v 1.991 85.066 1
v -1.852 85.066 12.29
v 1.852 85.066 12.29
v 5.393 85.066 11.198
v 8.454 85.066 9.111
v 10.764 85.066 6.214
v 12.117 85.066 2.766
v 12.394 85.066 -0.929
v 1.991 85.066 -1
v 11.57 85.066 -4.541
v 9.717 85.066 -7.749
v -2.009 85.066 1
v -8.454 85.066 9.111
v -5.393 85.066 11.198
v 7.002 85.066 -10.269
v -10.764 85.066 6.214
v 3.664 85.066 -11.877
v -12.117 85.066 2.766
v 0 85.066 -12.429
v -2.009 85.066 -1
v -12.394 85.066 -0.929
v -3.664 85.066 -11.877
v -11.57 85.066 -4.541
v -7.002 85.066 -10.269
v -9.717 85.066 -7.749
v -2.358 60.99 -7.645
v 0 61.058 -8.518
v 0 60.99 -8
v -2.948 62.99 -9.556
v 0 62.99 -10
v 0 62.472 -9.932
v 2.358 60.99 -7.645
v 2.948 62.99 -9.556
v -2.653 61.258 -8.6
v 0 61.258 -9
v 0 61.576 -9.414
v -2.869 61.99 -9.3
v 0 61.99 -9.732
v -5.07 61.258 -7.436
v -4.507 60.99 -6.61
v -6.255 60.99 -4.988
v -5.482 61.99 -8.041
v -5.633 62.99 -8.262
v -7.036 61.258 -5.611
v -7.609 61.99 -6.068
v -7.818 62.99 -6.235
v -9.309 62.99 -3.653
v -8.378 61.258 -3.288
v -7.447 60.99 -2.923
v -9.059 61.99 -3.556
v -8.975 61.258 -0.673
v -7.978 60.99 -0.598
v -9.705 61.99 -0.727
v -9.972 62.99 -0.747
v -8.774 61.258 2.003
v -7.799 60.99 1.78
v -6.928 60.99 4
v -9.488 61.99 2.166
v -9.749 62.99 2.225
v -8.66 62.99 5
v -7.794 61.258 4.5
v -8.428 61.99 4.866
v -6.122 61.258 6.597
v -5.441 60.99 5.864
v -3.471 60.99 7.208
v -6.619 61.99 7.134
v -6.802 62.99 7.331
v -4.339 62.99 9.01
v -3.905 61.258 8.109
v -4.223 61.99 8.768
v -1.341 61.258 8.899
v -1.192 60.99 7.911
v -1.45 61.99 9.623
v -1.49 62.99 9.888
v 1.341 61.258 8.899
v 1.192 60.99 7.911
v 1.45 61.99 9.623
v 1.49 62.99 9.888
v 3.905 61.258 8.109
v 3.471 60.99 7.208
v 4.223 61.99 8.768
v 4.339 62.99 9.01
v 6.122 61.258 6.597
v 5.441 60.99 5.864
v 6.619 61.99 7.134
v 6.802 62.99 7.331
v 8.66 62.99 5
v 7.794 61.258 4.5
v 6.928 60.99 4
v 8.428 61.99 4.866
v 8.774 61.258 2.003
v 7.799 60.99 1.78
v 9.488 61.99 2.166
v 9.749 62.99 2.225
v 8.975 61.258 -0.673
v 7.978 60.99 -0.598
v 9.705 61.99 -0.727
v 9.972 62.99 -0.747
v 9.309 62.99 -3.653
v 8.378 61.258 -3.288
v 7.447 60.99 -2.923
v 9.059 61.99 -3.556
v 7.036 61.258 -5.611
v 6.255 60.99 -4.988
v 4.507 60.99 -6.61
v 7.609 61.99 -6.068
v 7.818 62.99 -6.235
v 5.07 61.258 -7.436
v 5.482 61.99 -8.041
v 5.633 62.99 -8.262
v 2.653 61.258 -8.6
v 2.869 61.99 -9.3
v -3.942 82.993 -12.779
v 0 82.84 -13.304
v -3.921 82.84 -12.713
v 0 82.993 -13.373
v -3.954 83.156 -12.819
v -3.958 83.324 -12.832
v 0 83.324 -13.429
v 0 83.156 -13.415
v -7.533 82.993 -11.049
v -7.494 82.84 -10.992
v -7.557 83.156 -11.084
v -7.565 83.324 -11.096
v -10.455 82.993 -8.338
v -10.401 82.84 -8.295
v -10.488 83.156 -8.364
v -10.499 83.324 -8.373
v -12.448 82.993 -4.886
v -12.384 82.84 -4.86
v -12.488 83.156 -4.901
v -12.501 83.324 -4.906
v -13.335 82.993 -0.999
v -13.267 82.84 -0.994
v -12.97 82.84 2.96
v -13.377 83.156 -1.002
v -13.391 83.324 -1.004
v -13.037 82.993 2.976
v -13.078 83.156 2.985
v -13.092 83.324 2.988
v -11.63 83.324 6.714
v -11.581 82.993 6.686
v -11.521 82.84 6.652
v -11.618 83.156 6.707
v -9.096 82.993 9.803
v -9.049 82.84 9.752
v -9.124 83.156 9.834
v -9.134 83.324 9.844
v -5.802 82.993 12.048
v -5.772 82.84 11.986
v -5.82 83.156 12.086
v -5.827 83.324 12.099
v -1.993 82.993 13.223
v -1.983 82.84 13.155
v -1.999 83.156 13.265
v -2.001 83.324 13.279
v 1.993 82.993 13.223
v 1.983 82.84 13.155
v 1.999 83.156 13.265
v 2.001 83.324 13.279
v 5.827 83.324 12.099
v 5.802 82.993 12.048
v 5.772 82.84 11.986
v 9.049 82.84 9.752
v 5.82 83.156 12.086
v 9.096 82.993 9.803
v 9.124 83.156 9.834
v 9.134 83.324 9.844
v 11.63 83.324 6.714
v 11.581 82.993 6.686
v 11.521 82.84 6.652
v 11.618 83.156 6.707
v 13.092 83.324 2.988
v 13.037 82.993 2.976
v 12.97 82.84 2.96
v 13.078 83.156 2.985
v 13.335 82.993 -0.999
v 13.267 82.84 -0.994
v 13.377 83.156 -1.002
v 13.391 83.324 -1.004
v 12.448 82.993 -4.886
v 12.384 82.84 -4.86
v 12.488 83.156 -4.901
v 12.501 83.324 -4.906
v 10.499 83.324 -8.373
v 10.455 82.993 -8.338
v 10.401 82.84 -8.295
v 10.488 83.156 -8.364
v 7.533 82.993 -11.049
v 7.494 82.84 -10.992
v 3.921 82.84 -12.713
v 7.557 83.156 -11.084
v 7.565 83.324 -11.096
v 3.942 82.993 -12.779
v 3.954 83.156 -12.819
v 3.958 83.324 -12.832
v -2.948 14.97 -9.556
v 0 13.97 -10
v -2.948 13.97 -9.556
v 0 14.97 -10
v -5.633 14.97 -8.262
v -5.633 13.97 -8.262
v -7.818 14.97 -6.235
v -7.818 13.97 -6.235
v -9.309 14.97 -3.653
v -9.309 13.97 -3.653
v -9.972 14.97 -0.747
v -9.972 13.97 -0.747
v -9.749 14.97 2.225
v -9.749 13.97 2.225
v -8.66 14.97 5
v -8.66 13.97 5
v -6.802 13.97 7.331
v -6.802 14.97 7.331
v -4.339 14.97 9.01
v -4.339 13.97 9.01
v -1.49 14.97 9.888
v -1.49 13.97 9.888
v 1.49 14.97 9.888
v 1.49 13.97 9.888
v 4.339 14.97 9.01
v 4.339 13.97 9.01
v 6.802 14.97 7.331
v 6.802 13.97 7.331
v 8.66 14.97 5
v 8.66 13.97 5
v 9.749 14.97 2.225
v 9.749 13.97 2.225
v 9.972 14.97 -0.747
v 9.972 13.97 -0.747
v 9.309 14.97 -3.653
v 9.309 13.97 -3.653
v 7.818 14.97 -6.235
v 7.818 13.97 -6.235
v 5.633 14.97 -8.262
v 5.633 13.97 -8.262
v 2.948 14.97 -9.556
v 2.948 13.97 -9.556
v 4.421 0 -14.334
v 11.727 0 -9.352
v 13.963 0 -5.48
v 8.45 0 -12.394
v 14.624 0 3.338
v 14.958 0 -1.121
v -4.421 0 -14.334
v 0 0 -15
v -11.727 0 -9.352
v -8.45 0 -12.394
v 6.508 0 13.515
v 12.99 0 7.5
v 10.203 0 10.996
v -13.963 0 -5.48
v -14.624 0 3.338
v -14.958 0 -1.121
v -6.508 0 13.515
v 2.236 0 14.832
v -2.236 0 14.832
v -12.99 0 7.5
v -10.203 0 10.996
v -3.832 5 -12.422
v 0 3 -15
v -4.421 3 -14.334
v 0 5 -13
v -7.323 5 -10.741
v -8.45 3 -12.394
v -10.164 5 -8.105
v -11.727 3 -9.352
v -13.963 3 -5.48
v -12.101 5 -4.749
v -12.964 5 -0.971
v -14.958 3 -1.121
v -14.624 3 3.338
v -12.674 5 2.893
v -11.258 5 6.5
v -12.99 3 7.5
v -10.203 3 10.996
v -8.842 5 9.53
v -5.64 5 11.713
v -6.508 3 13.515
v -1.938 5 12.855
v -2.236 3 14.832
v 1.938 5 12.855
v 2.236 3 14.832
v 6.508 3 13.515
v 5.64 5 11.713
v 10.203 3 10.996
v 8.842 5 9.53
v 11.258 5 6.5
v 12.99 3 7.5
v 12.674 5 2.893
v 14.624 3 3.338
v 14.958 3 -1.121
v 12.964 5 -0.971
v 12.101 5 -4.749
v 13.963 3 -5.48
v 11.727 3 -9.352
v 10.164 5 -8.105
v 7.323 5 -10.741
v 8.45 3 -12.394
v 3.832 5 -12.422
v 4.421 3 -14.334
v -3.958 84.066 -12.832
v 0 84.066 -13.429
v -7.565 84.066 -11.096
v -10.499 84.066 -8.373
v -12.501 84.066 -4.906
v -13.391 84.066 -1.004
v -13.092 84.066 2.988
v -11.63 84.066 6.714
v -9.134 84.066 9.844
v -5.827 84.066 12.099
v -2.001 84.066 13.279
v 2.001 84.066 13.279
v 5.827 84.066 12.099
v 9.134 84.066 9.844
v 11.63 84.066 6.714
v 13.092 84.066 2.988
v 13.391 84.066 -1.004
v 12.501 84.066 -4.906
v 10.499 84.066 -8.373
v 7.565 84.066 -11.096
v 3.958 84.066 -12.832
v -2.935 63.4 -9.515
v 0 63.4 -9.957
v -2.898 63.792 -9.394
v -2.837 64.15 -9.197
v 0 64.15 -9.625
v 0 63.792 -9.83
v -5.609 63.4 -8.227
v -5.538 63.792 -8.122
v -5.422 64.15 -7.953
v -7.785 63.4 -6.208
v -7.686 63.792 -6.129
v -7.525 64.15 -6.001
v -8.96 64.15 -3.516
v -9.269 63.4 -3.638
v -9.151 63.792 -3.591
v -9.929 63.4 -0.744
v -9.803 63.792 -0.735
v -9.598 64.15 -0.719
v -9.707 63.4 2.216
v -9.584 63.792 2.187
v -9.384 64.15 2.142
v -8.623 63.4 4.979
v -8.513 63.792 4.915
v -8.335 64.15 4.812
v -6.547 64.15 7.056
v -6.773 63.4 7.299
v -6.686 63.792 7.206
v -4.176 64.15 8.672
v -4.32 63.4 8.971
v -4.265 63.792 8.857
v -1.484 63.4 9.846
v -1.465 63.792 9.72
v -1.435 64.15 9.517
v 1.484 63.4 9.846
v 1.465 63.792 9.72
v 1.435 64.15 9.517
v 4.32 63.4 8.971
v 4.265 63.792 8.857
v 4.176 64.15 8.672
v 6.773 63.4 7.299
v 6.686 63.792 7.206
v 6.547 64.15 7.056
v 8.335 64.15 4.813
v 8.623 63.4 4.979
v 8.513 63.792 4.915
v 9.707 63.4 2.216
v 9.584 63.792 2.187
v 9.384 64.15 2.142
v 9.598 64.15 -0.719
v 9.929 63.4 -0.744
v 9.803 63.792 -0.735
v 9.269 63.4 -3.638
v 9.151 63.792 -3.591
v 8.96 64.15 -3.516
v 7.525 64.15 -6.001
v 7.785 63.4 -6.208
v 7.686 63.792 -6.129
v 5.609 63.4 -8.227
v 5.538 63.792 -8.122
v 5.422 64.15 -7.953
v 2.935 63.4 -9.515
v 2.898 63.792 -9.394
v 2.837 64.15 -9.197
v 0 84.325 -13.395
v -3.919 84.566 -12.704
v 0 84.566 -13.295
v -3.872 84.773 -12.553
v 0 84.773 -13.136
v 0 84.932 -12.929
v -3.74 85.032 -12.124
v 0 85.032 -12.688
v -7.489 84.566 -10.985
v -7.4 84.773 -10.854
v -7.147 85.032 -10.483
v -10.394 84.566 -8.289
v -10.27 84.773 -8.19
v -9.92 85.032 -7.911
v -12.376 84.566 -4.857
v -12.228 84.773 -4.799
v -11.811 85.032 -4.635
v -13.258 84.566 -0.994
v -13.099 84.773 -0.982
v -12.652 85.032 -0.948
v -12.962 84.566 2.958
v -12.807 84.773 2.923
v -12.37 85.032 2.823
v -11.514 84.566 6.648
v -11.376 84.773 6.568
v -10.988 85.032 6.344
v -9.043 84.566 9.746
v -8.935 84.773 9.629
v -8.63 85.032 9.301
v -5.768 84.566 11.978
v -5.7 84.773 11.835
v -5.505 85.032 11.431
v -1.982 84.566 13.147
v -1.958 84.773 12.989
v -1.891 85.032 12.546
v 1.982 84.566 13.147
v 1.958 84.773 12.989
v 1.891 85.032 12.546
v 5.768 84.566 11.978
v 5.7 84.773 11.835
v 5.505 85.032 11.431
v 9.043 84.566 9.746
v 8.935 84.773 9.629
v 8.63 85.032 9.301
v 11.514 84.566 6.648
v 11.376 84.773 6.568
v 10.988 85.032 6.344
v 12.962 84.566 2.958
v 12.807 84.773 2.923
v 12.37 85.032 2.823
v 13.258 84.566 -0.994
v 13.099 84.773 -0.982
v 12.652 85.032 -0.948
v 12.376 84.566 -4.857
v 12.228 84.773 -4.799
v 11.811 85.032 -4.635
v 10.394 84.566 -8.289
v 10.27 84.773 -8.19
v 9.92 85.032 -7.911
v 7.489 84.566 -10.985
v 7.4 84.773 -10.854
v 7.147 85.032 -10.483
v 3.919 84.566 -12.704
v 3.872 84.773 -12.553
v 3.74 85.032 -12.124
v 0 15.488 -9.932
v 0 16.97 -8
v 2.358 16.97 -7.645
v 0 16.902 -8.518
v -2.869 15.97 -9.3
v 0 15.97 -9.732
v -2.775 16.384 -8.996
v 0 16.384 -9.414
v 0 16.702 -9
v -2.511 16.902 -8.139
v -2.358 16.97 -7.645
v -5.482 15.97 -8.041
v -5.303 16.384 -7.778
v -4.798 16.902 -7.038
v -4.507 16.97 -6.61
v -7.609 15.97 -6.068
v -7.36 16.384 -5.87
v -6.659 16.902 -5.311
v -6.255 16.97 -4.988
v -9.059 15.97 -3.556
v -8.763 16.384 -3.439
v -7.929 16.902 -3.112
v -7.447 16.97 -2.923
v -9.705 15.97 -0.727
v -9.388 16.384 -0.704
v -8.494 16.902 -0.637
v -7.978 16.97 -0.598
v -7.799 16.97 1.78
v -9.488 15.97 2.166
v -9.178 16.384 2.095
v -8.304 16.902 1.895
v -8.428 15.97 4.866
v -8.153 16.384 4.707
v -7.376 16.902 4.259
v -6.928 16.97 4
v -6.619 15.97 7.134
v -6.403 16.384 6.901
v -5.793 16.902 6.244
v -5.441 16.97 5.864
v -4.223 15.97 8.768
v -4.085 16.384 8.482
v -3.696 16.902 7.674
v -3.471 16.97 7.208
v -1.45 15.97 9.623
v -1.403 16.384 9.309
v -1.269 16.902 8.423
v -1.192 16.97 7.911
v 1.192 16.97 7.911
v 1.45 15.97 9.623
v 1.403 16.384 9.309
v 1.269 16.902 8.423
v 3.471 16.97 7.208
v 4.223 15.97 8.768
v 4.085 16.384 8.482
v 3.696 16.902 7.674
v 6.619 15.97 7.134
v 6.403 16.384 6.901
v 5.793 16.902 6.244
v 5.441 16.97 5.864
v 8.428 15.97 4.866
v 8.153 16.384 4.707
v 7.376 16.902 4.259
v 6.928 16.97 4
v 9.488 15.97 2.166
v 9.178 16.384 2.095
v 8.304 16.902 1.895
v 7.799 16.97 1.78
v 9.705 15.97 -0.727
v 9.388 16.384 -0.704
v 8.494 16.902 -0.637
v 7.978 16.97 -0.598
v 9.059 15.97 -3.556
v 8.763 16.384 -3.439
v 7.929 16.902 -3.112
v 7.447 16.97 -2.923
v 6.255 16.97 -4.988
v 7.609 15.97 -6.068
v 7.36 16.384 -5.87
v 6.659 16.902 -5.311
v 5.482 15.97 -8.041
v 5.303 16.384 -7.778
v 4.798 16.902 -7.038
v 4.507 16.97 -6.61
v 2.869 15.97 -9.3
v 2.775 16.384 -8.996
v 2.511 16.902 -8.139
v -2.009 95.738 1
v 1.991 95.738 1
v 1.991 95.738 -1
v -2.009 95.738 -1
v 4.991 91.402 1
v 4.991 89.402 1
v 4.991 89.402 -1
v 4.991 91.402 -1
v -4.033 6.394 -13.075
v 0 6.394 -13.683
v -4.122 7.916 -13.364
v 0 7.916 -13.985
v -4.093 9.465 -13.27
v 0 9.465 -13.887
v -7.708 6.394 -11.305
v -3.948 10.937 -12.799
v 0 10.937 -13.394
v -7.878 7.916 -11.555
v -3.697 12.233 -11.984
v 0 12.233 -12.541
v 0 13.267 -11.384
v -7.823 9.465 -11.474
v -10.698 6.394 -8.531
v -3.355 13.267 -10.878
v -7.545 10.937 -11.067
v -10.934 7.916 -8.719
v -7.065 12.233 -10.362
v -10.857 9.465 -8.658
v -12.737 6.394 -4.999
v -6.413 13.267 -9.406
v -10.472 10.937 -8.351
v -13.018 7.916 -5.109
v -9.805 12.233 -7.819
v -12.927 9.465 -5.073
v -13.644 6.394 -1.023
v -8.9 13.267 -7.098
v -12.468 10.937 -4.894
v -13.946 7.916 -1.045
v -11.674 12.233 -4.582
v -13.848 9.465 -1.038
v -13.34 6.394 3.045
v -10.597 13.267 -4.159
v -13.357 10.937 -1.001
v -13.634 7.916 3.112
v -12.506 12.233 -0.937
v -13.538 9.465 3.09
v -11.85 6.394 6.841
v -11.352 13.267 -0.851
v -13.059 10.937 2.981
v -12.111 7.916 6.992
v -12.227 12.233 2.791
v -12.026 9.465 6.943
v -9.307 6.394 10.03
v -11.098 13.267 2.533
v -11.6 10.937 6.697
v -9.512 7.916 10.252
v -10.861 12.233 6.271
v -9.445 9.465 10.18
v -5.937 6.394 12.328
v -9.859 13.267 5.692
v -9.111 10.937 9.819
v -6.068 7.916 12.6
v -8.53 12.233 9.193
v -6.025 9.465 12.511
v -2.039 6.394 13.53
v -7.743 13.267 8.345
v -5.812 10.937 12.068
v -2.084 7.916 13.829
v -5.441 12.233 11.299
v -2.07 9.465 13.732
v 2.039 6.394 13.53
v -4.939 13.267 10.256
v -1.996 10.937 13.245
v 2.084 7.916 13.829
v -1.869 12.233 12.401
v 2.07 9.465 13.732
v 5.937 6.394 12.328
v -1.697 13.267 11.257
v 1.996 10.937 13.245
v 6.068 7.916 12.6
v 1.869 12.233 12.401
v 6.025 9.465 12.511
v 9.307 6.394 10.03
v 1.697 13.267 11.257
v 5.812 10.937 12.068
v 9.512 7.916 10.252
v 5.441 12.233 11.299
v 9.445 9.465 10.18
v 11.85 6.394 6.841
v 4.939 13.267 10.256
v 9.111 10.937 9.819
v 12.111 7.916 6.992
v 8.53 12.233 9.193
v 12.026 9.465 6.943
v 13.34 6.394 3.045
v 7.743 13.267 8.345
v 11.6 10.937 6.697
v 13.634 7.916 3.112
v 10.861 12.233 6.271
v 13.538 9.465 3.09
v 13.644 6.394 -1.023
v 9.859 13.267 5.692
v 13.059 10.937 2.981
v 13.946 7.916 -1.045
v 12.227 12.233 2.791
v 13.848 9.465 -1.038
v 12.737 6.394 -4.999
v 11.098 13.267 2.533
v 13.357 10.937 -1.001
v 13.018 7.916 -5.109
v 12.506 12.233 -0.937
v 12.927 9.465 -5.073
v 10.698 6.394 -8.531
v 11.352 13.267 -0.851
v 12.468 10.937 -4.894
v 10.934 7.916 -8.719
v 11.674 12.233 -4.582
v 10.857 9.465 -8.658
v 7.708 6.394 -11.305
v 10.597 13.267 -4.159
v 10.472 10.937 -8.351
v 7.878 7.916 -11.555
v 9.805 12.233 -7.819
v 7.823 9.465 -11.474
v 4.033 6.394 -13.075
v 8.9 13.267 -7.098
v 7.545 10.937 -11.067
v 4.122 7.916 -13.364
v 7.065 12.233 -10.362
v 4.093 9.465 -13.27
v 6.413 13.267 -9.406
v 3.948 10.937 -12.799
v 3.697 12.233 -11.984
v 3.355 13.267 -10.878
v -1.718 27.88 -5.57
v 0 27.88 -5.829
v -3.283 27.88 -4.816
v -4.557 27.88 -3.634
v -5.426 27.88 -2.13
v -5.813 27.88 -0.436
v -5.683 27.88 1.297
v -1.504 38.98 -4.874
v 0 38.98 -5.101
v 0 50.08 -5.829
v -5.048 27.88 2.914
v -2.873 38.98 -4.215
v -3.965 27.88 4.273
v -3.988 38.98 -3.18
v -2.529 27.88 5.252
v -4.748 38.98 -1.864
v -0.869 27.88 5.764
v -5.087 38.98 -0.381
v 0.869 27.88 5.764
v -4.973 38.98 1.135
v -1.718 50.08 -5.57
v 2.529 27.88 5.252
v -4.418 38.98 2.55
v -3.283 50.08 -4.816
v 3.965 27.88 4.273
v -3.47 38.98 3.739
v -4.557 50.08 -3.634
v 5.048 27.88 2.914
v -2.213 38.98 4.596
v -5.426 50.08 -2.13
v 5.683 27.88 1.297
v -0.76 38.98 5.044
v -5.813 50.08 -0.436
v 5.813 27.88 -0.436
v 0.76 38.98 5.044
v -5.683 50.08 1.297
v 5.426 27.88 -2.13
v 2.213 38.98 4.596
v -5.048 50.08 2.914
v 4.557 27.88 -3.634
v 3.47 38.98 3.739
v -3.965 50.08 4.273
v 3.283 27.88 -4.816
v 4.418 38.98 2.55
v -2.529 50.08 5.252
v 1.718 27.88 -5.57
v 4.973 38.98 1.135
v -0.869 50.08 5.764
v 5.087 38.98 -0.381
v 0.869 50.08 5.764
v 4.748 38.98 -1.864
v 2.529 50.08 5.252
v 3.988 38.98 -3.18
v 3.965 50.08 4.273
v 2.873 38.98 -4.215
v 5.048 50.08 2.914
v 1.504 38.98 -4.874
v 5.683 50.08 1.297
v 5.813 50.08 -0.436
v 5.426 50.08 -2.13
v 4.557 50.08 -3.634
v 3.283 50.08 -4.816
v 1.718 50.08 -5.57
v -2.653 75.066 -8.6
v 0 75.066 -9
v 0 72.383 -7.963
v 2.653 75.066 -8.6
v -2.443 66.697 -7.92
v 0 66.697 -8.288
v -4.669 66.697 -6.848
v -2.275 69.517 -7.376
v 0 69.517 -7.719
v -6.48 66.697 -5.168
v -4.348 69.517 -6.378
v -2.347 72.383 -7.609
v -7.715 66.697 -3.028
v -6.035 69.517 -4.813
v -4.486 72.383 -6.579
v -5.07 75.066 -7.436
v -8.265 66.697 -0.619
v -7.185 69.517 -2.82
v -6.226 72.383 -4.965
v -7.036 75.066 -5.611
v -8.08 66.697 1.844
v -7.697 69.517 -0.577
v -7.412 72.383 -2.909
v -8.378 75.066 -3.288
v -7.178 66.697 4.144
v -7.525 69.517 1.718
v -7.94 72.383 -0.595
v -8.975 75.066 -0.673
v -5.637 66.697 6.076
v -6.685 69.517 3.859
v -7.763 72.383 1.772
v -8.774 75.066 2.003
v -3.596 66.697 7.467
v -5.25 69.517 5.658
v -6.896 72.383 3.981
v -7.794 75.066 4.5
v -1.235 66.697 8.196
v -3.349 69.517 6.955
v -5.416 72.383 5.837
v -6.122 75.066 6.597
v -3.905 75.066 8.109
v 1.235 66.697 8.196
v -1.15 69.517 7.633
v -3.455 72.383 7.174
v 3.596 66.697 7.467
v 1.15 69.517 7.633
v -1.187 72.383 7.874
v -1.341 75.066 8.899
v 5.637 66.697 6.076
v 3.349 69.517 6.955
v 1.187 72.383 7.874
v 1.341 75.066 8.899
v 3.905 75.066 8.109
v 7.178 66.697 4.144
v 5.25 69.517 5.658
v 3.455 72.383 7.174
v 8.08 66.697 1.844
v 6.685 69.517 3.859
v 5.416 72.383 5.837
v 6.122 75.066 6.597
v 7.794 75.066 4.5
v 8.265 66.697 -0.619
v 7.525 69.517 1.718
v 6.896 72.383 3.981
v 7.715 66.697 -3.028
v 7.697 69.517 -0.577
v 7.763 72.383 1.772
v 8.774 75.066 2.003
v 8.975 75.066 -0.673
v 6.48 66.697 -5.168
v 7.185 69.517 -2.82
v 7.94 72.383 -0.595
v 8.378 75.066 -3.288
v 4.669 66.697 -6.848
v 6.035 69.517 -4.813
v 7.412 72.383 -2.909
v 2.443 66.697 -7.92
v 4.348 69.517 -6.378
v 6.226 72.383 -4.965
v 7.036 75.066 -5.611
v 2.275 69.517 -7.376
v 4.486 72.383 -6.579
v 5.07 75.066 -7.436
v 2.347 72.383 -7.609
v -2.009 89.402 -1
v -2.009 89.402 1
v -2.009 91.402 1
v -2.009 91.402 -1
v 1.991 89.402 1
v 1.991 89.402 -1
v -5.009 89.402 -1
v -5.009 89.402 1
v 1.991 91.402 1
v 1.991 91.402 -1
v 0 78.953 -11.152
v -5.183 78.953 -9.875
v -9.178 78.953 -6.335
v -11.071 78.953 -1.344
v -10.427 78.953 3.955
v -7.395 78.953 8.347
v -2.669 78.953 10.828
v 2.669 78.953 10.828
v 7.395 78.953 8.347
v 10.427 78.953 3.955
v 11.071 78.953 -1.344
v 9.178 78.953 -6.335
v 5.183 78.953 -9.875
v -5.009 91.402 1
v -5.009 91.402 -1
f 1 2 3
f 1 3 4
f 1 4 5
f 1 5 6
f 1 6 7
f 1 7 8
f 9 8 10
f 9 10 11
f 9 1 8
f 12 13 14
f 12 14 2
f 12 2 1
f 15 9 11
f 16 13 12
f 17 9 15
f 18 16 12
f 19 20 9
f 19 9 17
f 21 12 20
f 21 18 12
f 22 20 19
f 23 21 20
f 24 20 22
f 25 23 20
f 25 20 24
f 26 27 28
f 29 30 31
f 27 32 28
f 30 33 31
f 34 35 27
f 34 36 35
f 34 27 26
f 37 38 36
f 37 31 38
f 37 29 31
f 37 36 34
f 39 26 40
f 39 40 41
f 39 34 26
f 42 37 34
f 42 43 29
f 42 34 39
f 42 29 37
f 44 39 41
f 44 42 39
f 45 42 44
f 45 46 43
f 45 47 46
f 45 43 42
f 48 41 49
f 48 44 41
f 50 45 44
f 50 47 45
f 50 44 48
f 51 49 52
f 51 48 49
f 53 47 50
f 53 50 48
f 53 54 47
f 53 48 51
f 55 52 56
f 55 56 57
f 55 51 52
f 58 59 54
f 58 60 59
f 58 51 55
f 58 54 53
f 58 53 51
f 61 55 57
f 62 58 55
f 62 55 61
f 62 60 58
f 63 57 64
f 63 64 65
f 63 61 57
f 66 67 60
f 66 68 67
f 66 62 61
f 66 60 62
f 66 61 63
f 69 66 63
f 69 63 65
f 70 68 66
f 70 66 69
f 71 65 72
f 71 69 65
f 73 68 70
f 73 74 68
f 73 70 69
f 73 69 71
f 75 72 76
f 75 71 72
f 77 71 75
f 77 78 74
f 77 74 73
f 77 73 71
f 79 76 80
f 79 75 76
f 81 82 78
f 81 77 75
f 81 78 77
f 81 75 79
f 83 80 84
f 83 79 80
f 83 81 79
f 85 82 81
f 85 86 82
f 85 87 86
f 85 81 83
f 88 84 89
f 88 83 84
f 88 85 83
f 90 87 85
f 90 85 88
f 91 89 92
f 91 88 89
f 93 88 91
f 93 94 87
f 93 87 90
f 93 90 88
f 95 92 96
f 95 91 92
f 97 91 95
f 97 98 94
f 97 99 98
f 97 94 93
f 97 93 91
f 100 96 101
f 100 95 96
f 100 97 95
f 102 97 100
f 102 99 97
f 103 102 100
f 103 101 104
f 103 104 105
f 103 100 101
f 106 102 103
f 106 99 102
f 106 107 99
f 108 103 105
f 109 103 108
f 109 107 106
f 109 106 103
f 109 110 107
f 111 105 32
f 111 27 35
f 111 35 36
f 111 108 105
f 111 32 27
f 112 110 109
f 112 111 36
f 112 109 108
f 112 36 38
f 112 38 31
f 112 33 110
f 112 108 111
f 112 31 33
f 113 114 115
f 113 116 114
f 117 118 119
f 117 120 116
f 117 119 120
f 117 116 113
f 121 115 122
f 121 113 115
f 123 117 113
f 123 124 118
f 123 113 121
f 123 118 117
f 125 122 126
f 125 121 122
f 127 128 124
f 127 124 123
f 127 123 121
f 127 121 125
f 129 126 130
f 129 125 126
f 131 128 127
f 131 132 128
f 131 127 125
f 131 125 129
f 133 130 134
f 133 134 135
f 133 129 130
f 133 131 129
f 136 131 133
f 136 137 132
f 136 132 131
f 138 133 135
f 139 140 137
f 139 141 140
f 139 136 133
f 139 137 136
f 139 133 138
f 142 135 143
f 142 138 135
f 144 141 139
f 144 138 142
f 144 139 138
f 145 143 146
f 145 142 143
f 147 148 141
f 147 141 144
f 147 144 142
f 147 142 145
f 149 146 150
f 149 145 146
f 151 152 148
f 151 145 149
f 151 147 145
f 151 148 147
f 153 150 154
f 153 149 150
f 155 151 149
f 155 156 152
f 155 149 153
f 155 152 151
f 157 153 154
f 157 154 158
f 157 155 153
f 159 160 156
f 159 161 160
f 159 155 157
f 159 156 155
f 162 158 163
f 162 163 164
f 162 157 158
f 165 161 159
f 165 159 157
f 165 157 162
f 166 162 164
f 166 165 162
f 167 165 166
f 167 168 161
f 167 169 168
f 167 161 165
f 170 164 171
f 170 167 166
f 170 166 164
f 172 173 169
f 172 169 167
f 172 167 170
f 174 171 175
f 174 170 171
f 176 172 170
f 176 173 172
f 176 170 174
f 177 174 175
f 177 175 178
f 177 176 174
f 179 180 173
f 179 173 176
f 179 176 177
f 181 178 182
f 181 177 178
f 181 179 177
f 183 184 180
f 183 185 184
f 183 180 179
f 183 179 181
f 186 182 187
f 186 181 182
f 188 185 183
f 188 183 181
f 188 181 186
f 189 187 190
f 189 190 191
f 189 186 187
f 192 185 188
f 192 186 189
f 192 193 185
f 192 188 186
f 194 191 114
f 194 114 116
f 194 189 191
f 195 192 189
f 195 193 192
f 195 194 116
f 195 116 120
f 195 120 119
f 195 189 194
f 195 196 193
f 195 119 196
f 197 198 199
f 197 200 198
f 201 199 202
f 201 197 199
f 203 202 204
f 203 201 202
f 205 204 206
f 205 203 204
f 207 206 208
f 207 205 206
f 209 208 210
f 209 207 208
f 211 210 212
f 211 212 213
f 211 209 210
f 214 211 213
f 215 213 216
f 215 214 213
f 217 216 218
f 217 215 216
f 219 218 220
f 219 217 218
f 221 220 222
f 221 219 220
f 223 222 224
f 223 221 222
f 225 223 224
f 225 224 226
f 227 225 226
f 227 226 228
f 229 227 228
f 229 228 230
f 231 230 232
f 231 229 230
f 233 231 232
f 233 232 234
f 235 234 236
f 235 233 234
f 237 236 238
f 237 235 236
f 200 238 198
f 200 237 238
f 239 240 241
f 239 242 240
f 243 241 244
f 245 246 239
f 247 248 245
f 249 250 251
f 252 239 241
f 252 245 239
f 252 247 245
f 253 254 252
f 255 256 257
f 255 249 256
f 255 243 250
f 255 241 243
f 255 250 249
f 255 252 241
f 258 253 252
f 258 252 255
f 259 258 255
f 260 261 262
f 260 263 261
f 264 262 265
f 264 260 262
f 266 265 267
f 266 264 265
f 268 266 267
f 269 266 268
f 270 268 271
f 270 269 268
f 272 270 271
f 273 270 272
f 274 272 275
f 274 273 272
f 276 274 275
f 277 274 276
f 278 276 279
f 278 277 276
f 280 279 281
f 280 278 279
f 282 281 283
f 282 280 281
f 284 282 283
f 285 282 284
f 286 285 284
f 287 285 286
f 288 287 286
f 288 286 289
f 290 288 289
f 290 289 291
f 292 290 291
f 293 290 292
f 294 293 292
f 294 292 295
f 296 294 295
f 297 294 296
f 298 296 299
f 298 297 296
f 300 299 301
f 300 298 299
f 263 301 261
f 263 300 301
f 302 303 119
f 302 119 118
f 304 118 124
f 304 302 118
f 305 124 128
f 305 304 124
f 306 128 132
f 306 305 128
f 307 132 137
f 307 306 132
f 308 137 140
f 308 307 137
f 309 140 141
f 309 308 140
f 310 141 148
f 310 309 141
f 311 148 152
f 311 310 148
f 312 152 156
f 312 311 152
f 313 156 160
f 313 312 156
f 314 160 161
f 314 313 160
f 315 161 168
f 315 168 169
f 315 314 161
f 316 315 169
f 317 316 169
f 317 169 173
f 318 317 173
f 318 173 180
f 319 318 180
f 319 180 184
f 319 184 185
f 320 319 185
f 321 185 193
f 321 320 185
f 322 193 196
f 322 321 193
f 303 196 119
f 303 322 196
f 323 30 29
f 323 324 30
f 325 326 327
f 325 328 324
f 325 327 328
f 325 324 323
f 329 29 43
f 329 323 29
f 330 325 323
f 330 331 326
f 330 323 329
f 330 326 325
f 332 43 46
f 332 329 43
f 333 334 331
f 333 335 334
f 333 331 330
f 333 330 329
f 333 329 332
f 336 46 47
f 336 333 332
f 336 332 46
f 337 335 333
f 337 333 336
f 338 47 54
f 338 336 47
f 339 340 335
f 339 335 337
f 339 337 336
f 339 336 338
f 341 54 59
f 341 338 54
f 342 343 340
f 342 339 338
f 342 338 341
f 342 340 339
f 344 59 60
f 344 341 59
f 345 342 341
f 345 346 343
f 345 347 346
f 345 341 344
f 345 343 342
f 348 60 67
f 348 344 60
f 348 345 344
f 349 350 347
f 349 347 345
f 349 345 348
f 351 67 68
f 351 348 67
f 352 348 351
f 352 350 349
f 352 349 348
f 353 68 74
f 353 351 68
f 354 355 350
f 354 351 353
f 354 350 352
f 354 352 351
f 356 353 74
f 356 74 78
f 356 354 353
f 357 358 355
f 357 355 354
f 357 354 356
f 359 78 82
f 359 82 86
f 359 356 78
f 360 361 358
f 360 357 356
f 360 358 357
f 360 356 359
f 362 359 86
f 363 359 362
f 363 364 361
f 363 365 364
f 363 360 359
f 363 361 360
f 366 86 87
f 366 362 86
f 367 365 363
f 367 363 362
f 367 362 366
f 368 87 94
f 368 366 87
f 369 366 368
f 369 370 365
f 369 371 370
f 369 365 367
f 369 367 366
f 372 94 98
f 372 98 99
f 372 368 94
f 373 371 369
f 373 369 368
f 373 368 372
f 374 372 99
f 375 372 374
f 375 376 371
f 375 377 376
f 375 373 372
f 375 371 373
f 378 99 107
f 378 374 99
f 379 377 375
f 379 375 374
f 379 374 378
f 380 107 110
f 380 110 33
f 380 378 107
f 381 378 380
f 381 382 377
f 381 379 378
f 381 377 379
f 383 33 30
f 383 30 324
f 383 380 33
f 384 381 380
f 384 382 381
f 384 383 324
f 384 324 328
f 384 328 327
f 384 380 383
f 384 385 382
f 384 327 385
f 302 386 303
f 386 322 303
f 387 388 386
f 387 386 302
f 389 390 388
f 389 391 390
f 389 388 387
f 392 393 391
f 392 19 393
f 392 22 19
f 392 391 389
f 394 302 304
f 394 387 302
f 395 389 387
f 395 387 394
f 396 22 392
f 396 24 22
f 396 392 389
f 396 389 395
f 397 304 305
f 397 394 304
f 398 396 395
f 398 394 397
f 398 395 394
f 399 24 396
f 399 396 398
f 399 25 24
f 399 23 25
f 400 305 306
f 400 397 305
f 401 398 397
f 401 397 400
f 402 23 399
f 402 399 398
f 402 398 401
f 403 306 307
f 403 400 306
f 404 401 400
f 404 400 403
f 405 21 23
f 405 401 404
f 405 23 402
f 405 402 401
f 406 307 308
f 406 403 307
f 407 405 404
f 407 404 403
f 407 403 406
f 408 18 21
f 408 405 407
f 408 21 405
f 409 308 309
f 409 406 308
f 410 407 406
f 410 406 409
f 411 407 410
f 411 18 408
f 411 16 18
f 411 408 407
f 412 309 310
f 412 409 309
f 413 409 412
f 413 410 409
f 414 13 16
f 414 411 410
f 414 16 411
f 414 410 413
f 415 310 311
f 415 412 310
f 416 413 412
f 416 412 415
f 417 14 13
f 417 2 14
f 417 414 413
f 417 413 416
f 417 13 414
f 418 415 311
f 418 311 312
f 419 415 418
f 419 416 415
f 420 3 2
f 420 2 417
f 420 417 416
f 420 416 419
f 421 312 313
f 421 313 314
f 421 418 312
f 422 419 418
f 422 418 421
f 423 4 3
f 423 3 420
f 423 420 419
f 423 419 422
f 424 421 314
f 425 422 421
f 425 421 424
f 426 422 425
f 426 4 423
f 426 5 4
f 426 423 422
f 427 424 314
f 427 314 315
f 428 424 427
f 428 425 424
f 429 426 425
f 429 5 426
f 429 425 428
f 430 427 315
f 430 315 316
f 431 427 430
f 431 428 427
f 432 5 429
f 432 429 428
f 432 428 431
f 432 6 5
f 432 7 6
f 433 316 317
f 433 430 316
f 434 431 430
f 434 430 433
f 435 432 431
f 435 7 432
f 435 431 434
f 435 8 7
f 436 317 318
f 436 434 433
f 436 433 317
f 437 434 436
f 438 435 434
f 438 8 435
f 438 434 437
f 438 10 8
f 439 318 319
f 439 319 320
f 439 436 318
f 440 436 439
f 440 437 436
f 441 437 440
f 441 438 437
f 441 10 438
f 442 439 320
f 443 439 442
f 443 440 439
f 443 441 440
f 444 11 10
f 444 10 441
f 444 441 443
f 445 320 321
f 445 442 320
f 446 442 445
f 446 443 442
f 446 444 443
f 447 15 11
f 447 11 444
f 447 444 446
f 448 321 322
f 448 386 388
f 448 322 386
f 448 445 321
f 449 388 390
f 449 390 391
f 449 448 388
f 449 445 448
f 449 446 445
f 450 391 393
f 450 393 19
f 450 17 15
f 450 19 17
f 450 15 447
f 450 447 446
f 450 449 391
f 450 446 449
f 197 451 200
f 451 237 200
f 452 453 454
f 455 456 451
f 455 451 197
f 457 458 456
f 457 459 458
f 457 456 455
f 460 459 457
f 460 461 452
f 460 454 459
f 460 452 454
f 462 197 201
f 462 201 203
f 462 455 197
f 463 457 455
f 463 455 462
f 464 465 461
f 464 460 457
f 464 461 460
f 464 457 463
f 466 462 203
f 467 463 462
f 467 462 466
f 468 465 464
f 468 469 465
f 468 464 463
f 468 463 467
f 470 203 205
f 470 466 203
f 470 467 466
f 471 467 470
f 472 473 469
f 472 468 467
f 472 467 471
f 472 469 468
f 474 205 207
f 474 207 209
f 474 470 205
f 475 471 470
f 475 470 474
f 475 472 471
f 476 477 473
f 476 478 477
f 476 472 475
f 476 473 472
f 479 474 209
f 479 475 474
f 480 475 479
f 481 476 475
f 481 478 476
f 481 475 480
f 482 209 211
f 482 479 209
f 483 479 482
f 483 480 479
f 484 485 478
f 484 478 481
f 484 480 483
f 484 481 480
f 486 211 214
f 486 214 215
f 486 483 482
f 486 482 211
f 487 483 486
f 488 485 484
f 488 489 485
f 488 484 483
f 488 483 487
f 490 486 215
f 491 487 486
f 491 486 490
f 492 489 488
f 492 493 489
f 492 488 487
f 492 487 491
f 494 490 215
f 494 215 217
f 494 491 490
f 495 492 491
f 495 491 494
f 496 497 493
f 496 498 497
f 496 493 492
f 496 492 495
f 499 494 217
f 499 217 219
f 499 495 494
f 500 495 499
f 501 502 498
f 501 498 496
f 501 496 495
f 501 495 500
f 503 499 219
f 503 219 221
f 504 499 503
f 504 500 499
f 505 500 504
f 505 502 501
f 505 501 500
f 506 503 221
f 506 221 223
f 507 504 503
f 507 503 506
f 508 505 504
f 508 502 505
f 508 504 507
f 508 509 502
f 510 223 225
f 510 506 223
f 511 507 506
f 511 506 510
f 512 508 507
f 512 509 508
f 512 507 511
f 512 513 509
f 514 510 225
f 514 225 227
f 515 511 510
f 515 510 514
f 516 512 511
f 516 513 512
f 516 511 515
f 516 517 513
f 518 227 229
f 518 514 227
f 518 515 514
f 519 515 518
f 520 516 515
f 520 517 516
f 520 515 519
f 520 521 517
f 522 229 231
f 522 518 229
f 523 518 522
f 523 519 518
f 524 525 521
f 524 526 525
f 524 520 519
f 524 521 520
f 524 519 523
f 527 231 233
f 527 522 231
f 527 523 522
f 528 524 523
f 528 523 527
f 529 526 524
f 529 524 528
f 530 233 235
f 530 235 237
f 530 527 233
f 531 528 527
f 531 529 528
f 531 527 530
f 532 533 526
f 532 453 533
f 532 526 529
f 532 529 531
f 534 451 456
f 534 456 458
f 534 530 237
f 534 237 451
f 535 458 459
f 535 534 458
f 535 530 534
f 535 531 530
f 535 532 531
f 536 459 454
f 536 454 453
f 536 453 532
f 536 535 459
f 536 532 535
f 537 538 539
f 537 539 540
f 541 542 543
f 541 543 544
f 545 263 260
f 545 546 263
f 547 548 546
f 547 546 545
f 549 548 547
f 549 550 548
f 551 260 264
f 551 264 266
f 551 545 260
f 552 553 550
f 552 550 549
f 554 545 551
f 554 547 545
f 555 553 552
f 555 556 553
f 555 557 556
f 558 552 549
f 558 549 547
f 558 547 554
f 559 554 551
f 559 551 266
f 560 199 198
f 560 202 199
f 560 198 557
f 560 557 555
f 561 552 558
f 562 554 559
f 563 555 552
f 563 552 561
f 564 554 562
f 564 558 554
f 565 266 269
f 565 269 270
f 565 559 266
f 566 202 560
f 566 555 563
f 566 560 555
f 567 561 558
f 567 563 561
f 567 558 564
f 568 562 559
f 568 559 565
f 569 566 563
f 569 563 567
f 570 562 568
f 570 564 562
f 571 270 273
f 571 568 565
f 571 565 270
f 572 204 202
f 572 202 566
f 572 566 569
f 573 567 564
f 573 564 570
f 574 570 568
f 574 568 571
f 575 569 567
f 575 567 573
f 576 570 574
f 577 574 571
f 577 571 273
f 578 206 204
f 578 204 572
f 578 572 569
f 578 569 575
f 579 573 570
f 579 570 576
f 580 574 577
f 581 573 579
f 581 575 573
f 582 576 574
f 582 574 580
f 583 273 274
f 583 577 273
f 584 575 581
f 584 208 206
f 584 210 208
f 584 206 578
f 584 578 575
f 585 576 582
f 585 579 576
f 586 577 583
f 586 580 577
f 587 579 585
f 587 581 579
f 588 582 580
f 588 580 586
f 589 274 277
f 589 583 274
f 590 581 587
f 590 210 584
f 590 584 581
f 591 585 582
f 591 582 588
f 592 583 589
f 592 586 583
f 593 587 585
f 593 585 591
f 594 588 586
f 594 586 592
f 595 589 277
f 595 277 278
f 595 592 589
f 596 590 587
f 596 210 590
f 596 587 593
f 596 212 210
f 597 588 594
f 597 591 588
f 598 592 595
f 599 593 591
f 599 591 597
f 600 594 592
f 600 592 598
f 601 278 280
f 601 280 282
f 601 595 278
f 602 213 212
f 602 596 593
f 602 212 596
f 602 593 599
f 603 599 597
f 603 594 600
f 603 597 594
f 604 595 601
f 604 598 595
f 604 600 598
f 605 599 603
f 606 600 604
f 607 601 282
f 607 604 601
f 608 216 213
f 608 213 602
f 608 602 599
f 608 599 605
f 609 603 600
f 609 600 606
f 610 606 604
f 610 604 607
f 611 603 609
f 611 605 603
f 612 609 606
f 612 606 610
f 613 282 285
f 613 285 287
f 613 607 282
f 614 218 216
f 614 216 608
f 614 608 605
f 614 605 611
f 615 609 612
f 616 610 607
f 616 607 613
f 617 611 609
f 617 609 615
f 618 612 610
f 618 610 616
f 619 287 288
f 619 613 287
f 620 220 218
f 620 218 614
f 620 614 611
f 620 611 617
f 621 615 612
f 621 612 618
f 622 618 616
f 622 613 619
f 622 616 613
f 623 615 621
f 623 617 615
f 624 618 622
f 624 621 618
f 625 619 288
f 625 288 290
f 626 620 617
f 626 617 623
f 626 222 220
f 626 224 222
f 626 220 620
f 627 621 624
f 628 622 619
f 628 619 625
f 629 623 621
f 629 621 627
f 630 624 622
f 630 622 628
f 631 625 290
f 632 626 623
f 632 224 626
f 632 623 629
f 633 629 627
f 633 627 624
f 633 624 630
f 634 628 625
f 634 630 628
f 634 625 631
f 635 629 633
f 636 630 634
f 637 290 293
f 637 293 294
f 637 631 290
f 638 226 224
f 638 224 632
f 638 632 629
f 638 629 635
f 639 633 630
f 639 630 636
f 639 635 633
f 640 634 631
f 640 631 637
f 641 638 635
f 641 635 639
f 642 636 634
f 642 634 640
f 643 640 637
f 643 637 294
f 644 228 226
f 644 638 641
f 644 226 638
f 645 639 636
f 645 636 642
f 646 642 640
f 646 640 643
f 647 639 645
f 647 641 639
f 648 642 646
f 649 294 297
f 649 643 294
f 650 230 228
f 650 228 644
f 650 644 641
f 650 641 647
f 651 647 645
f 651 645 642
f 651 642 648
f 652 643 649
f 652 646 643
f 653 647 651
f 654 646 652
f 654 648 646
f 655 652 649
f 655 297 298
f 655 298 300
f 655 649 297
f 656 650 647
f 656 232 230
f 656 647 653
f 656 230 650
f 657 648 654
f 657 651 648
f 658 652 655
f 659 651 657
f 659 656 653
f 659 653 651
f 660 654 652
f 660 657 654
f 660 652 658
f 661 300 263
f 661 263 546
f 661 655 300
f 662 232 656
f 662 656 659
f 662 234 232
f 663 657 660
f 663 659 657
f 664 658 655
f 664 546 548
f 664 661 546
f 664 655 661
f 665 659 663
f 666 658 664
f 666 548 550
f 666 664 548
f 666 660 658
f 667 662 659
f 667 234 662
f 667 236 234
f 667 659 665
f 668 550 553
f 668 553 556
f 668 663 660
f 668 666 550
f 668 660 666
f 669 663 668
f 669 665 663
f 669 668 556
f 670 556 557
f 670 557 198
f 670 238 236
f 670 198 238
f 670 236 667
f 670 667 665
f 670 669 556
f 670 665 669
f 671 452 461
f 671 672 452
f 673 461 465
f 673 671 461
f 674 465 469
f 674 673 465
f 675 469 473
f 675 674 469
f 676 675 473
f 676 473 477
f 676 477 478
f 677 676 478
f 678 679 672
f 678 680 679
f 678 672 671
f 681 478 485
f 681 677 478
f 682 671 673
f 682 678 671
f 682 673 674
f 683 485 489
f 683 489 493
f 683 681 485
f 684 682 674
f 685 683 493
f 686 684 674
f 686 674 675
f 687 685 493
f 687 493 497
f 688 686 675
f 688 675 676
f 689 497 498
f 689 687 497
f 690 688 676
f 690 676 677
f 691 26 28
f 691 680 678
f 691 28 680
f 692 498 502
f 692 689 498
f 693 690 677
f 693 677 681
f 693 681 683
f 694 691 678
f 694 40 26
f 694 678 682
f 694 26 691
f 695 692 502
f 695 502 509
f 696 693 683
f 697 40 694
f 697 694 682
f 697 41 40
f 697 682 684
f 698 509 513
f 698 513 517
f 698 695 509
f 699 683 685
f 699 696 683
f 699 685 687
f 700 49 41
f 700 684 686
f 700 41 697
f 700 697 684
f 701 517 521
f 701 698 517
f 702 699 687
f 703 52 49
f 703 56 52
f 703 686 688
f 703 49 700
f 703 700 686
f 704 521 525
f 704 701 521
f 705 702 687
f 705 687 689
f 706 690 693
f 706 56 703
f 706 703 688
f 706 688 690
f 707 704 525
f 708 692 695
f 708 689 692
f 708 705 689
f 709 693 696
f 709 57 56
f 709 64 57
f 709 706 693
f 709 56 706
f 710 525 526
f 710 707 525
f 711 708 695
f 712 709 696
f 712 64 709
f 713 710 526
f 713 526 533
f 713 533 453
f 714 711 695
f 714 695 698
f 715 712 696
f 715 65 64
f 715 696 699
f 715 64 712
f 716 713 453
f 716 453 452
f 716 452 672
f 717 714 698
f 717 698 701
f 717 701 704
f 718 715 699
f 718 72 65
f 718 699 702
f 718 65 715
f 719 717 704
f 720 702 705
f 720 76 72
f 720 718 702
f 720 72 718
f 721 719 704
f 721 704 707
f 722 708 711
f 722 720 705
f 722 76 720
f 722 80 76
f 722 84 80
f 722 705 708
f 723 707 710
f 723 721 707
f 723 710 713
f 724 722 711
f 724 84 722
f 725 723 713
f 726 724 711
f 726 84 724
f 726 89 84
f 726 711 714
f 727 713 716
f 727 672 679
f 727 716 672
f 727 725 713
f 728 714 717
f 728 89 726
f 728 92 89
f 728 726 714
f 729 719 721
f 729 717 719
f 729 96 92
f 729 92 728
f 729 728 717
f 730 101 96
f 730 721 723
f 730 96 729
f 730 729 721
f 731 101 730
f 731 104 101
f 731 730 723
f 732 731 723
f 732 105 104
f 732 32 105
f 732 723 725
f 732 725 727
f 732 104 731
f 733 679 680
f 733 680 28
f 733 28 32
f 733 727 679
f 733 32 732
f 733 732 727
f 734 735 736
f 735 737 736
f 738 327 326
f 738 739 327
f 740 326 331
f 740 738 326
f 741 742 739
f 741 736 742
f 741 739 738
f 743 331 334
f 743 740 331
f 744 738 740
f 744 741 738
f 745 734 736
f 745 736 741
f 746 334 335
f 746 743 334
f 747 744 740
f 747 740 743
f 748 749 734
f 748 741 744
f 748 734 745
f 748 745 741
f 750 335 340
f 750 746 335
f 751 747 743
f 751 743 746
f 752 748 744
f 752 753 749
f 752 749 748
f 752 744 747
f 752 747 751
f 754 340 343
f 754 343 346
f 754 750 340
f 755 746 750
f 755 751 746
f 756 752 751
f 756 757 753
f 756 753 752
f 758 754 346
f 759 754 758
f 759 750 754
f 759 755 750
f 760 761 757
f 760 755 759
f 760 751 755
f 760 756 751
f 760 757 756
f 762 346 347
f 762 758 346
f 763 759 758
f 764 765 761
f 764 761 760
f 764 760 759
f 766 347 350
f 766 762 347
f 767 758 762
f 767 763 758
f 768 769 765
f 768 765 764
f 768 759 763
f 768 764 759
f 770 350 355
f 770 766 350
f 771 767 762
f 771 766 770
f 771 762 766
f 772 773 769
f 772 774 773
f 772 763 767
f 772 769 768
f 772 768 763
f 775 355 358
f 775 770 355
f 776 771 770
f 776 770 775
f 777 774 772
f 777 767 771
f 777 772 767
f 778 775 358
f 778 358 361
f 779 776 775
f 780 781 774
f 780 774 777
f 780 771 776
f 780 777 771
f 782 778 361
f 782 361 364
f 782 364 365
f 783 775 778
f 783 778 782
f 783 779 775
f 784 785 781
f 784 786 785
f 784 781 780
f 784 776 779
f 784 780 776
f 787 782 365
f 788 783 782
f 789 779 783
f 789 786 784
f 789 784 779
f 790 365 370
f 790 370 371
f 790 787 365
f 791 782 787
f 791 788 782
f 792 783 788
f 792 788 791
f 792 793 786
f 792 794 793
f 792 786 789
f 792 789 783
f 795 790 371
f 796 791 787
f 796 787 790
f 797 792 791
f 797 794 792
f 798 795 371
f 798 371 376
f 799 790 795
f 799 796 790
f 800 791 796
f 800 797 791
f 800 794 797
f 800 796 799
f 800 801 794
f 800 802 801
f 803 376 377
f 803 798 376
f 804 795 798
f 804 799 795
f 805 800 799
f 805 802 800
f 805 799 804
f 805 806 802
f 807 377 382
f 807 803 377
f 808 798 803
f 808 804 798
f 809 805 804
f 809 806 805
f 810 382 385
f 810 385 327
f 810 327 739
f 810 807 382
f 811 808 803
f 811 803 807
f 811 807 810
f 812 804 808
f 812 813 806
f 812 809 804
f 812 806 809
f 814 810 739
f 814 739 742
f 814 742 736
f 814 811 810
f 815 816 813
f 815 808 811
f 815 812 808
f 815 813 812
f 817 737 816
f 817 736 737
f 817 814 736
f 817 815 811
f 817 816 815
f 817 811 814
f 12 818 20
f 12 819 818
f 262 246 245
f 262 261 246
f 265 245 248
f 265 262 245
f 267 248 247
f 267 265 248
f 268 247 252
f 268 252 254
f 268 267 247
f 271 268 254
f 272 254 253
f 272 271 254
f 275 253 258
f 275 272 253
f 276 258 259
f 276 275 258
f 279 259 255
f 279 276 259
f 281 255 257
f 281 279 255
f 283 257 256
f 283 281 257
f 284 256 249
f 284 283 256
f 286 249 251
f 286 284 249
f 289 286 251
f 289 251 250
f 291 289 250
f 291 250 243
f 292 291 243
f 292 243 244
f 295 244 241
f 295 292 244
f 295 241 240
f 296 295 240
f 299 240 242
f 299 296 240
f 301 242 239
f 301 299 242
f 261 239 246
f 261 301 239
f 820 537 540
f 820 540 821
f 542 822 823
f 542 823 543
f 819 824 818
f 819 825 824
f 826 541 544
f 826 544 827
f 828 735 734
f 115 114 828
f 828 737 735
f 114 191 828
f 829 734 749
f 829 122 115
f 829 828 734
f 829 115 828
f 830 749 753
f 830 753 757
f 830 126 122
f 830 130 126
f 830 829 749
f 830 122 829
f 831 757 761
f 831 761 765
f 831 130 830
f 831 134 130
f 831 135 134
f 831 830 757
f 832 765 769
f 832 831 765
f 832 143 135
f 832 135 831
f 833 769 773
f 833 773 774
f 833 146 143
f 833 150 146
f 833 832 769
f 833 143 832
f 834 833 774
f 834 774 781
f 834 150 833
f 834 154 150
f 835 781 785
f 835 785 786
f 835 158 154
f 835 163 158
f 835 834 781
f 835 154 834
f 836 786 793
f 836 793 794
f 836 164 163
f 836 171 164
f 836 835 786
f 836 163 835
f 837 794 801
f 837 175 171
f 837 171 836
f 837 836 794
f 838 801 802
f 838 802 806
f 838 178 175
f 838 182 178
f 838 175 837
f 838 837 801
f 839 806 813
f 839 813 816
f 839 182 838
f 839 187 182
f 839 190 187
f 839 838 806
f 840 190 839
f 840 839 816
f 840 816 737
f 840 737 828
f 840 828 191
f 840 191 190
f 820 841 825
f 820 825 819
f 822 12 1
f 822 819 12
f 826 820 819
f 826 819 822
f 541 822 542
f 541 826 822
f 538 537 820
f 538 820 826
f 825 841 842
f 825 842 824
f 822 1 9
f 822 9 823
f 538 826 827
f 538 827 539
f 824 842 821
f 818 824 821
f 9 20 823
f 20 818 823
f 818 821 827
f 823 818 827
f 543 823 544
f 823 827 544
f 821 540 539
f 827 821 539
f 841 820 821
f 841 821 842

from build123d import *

# Parameters (mm, degrees)
FILLET1_R           = 1
BOSS_EXTRUDE1_DEPTH = 1


with BuildPart() as part:
    # Sketch1 → Revolve1 (revolve)
    with BuildSketch(Plane.XY, mode=Mode.PRIVATE) as revolve1_sk:
        with BuildLine():
            Line((0, 0), (-15, 0))
            Line((-15, 0), (-15, 3))
            Line((-15, 3), (-13, 5))
            ThreePointArc((-13, 5), (-13.688325627, 10.216881481), (-10, 13.97))
            Line((-10, 13.97), (-10, 14.97))
            ThreePointArc((-10, 14.97), (-9.414213562, 16.384213562), (-8, 16.97))
            ThreePointArc((-8, 16.97), (-5.100912906, 38.98), (-8, 60.99))
            ThreePointArc((-8, 60.99), (-9.414213562, 61.575786438), (-10, 62.99))
            ThreePointArc((-10, 62.99), (-9.903920807, 63.59955414), (-9.625, 64.15))
            ThreePointArc((-9.625, 64.15), (-7.718956652, 69.516640804), (-9, 75.065763501))
            Line((-9, 75.065763501), (-13.303871601, 82.839750191))
            ThreePointArc((-13.303871601, 82.839750191), (-13.397211325, 83.07397526), (-13.428998168, 83.324101795))
            Line((-13.428998168, 83.324101795), (-13.428998168, 85.065763501))
            Line((-13.428998168, 85.065763501), (0, 85.065763501))
            Line((0, 85.065763501), (0, 0))
        make_face()
    revolve(revolve1_sk.sketch.rotate(Axis((0, 0, 0), (0, 1, 0)), 270), axis=Axis((0, 0, 0), (0, 1, 0)))

    # Fillet1
    fillet1_edges = [part.edges().sort_by_distance(p)[0] for p in [
        (0, 85.065763501, 13.428998168),
    ]]
    fillet(fillet1_edges, radius=FILLET1_R)

    # Sketch2 → Boss-Extrude1 (add, symmetric)
    with BuildSketch(Plane.XY):
        Polygon((-2.008998168, 85.065763501), (1.991001832, 85.065763501), (1.991001832, 89.402035395), (4.991001832, 89.402035395), (4.991001832, 91.402035395), (1.991001832, 91.402035395), (1.991001832, 95.738307289), (-2.008998168, 95.738307289), (-2.008998168, 91.402035395), (-5.008998168, 91.402035395), (-5.008998168, 89.402035395), (-2.008998168, 89.402035395), align=None)
    extrude(amount=BOSS_EXTRUDE1_DEPTH, both=True)


solid = part.part
